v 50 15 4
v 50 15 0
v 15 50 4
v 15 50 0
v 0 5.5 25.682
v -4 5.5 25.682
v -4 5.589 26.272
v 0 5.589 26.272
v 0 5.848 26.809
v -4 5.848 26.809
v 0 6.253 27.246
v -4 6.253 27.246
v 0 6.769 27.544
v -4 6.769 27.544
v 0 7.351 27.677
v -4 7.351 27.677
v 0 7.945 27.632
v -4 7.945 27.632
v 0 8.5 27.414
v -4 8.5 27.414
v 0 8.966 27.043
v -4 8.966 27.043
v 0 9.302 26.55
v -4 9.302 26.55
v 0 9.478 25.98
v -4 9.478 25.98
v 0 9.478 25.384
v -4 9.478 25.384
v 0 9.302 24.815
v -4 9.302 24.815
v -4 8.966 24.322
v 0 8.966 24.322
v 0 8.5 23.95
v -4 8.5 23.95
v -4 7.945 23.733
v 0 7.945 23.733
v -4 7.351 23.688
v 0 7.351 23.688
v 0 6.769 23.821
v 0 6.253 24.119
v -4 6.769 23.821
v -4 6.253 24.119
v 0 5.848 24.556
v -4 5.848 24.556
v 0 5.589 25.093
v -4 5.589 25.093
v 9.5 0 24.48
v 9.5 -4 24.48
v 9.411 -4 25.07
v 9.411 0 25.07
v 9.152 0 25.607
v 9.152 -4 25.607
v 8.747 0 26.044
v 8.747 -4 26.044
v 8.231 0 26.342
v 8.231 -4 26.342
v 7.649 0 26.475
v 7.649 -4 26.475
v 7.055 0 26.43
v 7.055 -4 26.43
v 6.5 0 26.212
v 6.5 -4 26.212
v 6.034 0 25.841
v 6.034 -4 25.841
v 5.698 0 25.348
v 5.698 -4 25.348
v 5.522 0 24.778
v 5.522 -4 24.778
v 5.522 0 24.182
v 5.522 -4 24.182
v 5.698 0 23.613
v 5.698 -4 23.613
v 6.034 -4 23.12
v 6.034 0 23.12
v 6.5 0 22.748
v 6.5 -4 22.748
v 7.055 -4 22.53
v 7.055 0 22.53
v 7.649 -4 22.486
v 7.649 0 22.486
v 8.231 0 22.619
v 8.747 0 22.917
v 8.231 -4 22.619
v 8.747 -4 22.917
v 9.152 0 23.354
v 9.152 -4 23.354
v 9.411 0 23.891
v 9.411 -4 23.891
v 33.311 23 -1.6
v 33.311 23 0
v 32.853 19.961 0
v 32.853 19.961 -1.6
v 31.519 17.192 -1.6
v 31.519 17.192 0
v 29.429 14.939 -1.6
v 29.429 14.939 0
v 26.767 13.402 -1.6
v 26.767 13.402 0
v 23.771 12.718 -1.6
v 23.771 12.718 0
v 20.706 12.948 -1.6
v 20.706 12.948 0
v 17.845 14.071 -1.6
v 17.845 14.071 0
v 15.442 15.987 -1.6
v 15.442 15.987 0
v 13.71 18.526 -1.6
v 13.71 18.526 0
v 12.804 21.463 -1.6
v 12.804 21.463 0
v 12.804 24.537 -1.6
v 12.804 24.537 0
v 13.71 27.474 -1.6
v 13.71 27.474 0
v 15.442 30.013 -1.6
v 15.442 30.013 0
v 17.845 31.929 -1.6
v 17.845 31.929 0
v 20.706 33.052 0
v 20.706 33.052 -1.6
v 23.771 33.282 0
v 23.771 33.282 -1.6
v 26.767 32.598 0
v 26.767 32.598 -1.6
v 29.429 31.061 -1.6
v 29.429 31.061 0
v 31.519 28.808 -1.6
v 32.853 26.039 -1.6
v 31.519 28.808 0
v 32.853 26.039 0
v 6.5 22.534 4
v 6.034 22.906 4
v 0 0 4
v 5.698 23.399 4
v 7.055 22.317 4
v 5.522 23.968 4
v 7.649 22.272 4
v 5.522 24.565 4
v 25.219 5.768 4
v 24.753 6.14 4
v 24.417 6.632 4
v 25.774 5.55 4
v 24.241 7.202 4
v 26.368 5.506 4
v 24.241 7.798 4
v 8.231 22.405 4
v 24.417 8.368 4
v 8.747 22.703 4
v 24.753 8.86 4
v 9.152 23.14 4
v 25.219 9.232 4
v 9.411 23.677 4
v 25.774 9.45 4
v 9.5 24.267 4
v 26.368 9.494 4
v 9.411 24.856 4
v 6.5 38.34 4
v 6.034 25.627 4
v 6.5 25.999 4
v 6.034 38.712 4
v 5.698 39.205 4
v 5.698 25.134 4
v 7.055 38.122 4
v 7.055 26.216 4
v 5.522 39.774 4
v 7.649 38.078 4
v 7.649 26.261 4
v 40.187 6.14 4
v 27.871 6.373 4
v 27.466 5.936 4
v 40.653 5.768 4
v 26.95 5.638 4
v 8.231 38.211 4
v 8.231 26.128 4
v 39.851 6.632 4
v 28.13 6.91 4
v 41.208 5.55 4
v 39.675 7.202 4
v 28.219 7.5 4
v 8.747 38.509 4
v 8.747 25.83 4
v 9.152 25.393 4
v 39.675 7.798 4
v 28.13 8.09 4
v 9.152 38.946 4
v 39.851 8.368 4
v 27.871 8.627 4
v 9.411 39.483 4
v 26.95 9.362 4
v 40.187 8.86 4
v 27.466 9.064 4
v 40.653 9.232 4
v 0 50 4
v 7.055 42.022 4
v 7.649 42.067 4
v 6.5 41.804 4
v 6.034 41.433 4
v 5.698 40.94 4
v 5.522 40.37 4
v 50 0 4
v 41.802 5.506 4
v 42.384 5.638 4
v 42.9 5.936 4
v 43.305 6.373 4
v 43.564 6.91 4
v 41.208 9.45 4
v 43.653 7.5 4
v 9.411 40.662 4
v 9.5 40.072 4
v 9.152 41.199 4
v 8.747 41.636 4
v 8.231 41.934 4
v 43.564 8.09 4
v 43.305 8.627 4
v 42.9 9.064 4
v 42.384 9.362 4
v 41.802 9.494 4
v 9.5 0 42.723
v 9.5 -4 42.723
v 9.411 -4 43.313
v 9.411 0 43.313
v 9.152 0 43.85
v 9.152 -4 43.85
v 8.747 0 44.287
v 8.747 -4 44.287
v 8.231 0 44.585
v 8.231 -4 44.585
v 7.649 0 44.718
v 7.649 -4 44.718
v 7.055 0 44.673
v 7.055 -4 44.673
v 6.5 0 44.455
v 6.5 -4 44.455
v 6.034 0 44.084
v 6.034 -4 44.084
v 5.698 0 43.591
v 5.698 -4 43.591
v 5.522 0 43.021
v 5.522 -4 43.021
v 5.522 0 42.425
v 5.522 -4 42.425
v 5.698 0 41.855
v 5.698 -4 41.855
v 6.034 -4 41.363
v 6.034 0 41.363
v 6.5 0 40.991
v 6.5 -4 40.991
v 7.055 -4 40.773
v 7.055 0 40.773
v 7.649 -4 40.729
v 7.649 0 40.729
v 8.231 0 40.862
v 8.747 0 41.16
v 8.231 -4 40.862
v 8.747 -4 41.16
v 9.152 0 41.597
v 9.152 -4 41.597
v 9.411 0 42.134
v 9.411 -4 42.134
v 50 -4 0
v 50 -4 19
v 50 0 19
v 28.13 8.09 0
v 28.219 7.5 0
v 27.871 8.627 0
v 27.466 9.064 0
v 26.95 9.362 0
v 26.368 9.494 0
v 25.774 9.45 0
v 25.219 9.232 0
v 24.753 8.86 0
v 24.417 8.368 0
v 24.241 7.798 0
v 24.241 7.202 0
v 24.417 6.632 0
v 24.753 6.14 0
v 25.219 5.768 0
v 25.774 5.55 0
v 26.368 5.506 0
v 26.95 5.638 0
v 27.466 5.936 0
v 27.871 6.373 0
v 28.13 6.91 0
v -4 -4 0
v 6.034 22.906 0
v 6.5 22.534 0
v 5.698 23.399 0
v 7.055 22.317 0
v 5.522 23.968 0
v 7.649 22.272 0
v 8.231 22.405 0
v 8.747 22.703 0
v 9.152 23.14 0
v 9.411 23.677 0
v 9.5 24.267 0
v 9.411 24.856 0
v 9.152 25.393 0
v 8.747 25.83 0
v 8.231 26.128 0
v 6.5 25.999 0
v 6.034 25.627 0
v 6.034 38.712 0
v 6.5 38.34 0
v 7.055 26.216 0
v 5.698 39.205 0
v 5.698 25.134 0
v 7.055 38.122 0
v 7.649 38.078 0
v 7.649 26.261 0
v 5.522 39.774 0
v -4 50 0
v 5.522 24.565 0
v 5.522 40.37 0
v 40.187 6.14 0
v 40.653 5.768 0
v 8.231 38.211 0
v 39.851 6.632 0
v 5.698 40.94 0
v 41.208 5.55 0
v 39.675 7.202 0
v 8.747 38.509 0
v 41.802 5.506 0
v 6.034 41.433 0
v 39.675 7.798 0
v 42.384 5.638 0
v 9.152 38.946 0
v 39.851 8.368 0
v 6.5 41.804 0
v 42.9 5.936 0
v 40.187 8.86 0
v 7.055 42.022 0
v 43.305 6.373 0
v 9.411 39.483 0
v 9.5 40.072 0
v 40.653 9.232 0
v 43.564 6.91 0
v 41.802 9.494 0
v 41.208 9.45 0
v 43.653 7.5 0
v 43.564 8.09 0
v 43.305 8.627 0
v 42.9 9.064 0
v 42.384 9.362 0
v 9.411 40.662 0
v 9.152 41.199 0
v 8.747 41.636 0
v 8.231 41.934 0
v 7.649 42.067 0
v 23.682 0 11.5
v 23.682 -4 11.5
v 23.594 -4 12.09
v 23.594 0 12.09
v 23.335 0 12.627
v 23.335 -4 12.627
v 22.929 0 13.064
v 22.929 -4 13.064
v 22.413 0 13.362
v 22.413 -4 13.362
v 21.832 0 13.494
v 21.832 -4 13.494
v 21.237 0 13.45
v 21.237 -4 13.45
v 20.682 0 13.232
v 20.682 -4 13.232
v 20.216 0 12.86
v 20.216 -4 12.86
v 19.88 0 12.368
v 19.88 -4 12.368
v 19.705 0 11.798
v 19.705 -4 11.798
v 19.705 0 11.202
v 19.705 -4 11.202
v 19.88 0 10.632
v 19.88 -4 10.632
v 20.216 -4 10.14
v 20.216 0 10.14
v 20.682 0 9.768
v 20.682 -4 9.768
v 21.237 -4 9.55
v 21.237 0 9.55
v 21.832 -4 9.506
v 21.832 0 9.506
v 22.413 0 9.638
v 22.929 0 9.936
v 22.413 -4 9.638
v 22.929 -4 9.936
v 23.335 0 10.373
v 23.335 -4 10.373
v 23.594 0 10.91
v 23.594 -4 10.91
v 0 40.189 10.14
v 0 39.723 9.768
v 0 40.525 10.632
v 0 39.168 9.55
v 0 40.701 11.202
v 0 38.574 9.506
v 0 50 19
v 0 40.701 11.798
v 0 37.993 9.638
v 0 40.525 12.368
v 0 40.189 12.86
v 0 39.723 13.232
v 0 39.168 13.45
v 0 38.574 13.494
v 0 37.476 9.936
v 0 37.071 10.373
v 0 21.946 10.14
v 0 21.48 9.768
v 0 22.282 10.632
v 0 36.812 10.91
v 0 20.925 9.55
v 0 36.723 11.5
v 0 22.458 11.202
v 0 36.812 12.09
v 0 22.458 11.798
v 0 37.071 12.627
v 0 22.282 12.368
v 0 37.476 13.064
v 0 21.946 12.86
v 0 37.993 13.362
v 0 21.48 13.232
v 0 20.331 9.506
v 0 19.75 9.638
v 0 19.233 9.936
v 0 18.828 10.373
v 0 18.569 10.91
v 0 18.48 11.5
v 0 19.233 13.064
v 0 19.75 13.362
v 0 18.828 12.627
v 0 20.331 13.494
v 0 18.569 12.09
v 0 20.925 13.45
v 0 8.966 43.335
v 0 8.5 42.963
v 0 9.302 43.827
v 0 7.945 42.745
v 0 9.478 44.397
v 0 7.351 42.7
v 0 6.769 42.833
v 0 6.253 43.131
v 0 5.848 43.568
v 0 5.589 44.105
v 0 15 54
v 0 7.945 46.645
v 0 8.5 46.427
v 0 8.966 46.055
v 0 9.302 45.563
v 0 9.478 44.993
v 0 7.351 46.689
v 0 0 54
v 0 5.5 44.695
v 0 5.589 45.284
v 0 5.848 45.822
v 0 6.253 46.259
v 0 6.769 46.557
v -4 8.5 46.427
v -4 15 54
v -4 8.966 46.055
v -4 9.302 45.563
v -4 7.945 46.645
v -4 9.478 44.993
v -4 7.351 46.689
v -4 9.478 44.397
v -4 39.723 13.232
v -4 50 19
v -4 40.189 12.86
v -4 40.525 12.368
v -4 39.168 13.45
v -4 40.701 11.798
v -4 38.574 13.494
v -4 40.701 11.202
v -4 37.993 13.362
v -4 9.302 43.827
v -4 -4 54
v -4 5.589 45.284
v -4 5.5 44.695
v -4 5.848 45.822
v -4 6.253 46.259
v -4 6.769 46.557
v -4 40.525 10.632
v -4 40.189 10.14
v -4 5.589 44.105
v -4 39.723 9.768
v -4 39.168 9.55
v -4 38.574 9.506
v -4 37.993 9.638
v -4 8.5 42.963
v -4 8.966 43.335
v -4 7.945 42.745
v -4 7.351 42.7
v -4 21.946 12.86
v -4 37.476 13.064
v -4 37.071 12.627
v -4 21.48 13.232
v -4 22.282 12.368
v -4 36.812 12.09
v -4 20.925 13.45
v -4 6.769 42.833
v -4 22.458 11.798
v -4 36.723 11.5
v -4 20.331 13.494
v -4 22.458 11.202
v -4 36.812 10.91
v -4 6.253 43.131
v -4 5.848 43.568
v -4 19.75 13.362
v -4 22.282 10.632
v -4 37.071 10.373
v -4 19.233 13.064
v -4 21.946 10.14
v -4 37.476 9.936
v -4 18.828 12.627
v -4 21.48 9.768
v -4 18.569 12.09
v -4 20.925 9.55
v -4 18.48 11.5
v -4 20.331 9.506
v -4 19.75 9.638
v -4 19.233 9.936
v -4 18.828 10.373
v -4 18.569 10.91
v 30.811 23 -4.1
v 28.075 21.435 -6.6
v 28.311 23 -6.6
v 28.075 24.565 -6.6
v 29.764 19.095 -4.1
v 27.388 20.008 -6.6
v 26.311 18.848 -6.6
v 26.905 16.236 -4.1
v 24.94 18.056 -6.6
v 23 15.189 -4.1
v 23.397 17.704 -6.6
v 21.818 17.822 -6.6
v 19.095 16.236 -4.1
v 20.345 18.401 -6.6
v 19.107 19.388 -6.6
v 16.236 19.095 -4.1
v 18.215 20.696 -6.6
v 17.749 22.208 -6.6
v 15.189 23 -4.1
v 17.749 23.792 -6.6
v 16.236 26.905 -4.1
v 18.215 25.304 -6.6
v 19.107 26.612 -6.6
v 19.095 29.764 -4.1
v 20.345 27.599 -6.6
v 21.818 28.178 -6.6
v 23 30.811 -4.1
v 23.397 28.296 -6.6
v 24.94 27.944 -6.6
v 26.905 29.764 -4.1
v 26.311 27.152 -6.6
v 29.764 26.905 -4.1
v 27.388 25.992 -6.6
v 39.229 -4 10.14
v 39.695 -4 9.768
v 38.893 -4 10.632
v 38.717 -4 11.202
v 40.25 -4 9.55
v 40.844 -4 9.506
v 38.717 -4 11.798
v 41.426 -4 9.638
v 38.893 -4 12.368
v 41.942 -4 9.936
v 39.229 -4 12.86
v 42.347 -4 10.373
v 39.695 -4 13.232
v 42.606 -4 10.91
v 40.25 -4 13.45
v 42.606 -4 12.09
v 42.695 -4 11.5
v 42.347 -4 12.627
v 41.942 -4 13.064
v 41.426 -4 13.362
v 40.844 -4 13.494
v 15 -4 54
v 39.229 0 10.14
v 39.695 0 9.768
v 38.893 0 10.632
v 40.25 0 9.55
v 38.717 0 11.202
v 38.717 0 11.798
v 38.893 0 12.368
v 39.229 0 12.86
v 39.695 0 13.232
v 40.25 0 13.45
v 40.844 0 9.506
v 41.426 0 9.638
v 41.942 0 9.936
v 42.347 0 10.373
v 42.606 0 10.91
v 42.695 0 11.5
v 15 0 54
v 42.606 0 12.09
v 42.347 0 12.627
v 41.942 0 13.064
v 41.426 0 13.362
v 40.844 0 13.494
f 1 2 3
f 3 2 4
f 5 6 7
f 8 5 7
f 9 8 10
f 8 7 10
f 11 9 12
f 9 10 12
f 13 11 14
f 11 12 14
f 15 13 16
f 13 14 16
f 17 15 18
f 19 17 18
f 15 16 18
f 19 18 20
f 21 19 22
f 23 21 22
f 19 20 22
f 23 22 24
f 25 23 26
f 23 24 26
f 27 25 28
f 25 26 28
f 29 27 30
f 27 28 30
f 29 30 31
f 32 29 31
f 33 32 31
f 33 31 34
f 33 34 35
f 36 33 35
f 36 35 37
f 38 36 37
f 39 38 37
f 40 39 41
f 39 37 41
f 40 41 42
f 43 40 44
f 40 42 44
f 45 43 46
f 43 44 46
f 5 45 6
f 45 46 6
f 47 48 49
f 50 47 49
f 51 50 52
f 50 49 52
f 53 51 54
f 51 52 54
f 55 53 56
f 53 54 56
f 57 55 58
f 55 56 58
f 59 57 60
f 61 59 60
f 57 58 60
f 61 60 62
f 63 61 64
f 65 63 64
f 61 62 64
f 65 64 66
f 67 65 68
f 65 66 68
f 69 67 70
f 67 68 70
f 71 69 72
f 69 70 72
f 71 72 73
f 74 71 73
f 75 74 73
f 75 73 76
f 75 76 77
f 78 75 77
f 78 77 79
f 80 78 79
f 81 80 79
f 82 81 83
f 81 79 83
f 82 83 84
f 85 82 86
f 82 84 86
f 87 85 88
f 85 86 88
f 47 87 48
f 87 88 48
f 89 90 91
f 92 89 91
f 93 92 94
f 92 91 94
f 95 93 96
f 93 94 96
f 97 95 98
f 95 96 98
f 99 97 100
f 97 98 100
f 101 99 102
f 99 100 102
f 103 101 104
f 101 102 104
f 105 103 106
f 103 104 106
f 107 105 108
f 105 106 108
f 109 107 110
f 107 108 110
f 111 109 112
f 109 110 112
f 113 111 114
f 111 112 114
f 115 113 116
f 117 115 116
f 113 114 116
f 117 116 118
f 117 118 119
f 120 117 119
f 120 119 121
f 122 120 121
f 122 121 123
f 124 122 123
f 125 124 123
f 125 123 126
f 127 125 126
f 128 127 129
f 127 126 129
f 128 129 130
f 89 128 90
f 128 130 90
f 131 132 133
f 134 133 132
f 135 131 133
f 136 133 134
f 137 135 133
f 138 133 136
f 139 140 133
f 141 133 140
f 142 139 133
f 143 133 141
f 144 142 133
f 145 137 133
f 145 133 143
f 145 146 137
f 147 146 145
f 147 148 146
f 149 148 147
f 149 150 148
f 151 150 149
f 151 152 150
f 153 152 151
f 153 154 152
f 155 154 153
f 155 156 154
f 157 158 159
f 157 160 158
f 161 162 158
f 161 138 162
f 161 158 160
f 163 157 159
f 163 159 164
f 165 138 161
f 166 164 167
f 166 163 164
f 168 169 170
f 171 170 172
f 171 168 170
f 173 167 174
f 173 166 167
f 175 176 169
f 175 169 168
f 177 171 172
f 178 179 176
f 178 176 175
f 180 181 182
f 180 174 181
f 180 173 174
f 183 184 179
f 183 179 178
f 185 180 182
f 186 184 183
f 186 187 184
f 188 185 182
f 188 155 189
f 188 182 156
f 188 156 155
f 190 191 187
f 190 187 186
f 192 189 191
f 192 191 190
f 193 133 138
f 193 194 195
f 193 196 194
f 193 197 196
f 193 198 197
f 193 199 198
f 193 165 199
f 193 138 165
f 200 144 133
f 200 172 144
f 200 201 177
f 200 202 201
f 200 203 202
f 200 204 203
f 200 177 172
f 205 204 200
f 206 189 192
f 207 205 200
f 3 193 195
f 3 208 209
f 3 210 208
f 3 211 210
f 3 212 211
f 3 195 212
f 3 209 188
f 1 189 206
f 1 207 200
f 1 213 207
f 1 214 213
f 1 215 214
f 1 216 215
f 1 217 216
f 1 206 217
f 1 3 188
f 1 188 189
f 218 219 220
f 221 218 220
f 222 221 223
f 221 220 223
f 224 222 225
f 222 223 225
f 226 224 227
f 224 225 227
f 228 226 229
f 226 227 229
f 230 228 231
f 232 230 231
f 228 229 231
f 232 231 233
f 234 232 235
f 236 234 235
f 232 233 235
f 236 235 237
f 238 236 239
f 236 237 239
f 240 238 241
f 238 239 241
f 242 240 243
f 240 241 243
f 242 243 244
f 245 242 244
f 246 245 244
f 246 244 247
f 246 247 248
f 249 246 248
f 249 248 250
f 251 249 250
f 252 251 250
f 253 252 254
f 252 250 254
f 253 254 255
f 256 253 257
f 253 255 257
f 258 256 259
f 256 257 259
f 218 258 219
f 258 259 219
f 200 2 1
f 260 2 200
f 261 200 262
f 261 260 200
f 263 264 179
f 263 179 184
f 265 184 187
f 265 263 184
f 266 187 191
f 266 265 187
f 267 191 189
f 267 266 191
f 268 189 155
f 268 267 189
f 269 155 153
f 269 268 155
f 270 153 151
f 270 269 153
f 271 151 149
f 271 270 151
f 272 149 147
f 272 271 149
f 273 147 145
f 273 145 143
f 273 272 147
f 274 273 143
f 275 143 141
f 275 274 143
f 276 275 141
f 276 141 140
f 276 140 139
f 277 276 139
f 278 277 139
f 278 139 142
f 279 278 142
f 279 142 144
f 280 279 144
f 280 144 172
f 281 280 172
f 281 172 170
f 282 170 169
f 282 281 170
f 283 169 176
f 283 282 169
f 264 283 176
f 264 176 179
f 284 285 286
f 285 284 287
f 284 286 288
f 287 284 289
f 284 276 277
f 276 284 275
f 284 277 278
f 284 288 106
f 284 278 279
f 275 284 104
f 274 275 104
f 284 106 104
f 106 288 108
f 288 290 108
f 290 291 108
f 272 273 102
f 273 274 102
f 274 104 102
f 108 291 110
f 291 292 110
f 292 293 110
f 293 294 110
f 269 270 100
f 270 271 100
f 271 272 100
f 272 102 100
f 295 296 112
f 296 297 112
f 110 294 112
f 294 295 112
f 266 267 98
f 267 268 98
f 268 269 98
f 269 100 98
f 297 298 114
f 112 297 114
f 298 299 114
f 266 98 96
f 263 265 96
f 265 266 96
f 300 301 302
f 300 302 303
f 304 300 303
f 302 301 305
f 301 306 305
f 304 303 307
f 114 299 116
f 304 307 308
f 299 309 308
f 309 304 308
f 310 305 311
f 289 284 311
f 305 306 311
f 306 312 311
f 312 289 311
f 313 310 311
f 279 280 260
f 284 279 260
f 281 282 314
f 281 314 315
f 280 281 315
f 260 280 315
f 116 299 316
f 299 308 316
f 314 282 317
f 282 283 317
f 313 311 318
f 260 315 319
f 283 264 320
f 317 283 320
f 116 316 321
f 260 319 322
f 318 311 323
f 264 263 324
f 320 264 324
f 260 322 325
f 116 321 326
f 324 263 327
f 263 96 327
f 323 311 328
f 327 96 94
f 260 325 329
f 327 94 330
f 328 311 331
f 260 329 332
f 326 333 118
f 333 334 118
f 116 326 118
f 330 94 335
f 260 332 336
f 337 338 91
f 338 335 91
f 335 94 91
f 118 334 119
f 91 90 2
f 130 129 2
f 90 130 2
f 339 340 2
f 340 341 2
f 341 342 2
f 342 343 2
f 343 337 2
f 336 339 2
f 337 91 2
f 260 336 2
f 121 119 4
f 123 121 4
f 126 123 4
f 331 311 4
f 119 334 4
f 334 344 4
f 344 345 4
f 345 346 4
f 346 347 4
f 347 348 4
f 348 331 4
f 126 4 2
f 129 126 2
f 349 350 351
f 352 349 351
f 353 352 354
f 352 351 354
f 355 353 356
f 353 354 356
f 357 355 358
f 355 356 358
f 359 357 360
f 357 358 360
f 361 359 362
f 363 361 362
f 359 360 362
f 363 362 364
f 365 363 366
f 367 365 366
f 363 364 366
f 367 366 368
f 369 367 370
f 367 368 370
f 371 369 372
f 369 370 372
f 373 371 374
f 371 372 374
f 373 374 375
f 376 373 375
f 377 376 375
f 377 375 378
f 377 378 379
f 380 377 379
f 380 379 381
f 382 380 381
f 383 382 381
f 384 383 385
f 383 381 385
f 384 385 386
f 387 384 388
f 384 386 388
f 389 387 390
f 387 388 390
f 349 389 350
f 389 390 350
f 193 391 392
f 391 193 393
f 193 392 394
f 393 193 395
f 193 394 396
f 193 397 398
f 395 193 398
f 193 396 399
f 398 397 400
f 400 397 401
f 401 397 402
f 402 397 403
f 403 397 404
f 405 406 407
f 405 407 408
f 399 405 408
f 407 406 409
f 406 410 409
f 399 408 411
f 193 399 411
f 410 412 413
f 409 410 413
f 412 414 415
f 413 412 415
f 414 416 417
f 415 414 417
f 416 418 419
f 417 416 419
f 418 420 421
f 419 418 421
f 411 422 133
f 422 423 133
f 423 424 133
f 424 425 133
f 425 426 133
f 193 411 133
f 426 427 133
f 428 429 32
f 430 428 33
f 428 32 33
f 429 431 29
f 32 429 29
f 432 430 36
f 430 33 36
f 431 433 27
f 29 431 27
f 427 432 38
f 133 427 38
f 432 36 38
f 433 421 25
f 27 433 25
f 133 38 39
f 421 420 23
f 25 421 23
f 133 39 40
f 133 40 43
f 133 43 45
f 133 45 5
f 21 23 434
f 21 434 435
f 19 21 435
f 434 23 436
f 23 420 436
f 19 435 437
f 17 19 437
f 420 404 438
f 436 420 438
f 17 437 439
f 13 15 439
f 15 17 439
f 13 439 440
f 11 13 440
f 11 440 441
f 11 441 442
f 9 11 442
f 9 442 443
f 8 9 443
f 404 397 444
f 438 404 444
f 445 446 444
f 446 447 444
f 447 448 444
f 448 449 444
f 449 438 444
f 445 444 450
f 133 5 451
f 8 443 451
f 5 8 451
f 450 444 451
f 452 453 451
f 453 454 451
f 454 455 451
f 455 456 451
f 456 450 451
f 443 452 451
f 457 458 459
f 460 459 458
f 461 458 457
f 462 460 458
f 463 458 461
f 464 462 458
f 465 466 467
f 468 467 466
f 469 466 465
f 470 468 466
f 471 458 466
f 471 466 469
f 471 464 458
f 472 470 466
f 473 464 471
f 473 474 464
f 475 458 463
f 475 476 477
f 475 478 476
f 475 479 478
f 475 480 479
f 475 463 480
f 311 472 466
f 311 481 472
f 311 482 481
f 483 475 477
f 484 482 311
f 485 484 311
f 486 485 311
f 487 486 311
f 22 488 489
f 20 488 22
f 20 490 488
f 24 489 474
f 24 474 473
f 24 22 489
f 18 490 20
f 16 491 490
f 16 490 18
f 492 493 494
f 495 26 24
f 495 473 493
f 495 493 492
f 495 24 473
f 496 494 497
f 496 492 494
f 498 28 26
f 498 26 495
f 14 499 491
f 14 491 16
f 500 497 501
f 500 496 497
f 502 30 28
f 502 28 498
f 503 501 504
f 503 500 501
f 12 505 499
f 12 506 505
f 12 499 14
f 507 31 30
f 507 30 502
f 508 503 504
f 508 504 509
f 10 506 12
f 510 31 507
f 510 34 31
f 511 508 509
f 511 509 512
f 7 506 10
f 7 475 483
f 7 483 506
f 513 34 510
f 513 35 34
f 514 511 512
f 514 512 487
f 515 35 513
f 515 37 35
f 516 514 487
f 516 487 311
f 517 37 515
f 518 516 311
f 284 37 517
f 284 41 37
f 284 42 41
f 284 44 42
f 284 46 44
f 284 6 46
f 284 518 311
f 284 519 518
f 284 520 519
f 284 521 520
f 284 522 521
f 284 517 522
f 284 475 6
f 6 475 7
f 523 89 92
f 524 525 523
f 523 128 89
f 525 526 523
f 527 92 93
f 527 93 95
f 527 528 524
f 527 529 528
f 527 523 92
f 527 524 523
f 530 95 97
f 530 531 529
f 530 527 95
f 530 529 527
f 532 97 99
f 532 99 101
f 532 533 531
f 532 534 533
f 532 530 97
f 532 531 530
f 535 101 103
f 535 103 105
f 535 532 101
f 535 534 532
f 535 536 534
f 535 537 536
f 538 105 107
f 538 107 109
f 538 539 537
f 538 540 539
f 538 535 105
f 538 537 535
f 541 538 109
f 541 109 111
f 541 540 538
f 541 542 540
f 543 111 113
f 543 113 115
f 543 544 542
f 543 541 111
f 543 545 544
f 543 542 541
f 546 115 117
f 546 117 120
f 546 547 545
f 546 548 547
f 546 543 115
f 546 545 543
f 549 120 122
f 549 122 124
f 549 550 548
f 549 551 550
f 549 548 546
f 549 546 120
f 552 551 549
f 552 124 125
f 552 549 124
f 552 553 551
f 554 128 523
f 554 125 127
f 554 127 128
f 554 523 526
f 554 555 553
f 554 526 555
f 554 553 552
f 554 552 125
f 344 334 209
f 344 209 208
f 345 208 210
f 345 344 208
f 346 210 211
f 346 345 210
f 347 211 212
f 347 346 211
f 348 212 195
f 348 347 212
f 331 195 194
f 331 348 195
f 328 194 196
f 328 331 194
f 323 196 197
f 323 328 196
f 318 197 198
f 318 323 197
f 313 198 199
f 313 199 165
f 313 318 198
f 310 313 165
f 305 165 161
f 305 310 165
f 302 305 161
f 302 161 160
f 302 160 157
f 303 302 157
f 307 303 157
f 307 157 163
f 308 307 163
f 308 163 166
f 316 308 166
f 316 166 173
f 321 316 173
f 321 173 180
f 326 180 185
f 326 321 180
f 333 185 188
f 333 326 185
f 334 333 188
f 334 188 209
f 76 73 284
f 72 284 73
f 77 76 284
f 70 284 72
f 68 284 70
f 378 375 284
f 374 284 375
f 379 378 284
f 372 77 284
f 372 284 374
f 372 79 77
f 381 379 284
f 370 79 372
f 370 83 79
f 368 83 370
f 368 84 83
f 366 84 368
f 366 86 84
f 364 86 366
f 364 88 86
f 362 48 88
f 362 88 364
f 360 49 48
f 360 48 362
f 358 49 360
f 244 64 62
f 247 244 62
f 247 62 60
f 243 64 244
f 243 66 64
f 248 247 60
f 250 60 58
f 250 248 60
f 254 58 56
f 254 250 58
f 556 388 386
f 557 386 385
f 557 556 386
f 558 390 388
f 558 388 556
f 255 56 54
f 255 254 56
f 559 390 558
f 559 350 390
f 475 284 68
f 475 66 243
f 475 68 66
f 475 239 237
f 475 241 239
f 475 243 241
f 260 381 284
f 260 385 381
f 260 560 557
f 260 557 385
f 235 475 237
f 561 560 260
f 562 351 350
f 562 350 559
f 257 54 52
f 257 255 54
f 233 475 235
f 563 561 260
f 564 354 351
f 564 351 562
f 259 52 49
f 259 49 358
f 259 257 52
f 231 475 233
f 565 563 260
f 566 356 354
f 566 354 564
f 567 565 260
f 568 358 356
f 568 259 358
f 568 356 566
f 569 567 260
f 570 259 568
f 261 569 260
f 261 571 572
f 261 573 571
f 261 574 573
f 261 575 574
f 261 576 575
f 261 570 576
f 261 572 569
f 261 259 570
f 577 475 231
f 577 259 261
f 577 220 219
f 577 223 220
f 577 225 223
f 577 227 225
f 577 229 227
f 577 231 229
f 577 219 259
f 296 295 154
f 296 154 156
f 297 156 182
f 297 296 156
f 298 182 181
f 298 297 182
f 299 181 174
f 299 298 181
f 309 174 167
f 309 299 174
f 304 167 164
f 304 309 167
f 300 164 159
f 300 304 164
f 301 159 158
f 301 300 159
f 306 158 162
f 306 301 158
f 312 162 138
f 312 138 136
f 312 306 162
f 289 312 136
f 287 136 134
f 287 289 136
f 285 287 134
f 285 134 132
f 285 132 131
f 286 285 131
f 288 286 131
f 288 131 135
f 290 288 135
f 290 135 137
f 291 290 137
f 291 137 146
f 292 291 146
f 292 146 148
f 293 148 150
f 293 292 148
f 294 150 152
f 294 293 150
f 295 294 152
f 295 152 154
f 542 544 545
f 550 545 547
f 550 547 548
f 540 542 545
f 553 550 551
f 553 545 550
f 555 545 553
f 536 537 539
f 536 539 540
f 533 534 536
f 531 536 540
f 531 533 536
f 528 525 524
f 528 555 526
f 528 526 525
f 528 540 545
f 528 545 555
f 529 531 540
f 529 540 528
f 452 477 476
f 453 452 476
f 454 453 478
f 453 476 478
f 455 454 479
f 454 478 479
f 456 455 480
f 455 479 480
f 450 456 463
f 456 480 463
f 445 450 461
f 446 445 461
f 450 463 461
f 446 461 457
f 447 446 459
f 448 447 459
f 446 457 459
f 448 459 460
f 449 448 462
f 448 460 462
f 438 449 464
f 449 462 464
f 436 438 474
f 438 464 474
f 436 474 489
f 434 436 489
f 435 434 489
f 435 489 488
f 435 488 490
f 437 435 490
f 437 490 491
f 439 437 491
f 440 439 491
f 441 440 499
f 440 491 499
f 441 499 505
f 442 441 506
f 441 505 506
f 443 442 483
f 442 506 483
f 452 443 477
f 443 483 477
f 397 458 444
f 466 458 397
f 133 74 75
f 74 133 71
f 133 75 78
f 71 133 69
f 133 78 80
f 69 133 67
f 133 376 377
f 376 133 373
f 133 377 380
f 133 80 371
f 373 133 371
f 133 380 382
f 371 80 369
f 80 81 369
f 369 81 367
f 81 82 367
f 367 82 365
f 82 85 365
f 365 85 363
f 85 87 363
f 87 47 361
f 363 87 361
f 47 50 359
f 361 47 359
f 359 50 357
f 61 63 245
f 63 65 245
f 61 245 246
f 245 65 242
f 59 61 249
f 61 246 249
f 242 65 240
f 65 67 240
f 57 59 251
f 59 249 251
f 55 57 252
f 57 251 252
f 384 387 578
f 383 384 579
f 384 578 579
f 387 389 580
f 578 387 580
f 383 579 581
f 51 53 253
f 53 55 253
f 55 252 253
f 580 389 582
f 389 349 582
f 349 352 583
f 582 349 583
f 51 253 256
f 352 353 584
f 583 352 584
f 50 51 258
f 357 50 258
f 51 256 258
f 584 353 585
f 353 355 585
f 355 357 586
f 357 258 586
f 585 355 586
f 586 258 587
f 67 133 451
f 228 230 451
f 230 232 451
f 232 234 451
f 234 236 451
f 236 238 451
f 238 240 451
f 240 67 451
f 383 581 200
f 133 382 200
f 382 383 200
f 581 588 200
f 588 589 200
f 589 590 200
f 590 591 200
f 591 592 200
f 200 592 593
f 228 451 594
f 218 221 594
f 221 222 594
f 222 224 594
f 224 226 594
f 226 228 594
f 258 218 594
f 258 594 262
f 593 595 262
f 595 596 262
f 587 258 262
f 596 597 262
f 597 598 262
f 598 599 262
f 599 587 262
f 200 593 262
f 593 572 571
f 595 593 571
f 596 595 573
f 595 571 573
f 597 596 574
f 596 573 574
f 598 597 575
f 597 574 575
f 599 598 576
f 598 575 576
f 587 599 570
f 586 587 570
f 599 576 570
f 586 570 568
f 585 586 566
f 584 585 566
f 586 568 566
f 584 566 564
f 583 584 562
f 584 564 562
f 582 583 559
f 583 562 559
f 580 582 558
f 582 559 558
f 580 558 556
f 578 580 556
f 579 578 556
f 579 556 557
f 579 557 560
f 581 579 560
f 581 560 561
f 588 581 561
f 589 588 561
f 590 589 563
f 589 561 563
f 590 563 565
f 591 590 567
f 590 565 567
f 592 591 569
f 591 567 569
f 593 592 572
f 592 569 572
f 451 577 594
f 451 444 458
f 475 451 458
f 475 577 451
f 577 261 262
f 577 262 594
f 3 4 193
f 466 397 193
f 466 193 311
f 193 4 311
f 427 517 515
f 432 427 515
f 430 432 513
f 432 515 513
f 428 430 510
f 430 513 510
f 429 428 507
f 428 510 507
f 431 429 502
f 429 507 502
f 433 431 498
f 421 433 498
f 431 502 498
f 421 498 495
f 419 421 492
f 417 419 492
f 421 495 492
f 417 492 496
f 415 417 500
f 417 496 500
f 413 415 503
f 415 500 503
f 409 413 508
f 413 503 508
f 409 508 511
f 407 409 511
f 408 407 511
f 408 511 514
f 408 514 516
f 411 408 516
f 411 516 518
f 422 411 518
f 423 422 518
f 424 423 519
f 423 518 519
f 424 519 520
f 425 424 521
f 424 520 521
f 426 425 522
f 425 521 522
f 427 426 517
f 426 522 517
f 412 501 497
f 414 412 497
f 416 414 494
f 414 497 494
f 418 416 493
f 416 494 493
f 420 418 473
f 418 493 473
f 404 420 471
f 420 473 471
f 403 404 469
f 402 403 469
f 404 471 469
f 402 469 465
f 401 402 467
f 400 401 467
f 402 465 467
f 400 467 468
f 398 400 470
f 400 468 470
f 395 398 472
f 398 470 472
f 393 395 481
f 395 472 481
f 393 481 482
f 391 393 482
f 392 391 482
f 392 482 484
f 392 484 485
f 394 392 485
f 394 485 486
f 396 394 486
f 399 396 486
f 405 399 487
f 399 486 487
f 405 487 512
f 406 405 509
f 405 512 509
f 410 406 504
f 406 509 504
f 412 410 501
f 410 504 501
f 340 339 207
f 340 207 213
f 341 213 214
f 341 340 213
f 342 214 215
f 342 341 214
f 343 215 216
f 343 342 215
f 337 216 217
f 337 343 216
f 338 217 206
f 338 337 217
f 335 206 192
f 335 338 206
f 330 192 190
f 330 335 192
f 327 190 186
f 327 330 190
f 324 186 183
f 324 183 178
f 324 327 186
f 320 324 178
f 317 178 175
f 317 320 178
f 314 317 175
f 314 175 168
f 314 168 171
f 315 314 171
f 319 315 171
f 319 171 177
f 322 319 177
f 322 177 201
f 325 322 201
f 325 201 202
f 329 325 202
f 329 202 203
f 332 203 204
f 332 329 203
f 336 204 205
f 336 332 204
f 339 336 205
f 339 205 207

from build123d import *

# Parameters (mm, degrees)
F0_R     = 2
F1_DEPTH = 4
F2_R     = 2
F3_DEPTH = 4
F4_R     = 2
F5_DEPTH = 4
F6_R     = 10.310679
F7_DEPTH = 6.6
F8_SIZE  = 5


with BuildPart() as f1:
    # F0 (on Top) → F1 (new body)
    with BuildSketch(Plane.XY):
        Polygon((15, 50), (0, 50), (-4, 50), (-4, 0), (-4, -4), (50, -4), (50, 0), (50, 15), align=None)
        with Locations((26.219012, 7.5)):
            Circle(F0_R, mode=Mode.SUBTRACT)
        with Locations((41.652899, 7.5)):
            Circle(F0_R, mode=Mode.SUBTRACT)
        with Locations((7.5, 24.26653)):
            Circle(F0_R, mode=Mode.SUBTRACT)
        with Locations((7.5, 40.072314)):
            Circle(F0_R, mode=Mode.SUBTRACT)
    extrude(amount=F1_DEPTH)

    # F2 (on face) → F3 (join)
    with BuildSketch(Plane.XZ.offset(4)):
        Polygon((-4, 54), (-4, 4), (50, 4), (50, 19), (15, 54), align=None)
        with Locations((21.682408, 11.5)):
            Circle(F2_R, mode=Mode.SUBTRACT)
        with Locations((7.5, 24.480278)):
            Circle(F2_R, mode=Mode.SUBTRACT)
        with Locations((40.694896, 11.5)):
            Circle(F2_R, mode=Mode.SUBTRACT)
        with Locations((7.5, 42.723257)):
            Circle(F2_R, mode=Mode.SUBTRACT)
    extrude(amount=-F3_DEPTH)

    # F4 (on face) → F5 (join)
    with BuildSketch(Plane(origin=(-4, 0, 0), x_dir=(0, -1, 0), z_dir=(-1, 0, 0))):
        Polygon((-50, 0), (0, 0), (0, 54), (-15, 54), (-50, 19), align=None)
        with Locations((-38.723257, 11.5)):
            Circle(F4_R, mode=Mode.SUBTRACT)
        with Locations((-20.480278, 11.5)):
            Circle(F4_R, mode=Mode.SUBTRACT)
        with Locations((-7.5, 25.682408)):
            Circle(F4_R, mode=Mode.SUBTRACT)
        with Locations((-7.5, 44.694896)):
            Circle(F4_R, mode=Mode.SUBTRACT)
    extrude(amount=-F5_DEPTH)

    # F6 (on face) → F7 (join)
    with BuildSketch(Plane(origin=(0, 0, 0), x_dir=(1, 0, 0), z_dir=(0, 0, -1))):
        with Locations((23, -23)):
            Circle(F6_R)
    extrude(amount=F7_DEPTH)

    # F8
    f8_edges = [f1.edges().sort_by_distance(p)[0] for p in [
        (12.689321, 23, -6.6),
    ]]
    chamfer(f8_edges, length=F8_SIZE)


solid = f1.part
